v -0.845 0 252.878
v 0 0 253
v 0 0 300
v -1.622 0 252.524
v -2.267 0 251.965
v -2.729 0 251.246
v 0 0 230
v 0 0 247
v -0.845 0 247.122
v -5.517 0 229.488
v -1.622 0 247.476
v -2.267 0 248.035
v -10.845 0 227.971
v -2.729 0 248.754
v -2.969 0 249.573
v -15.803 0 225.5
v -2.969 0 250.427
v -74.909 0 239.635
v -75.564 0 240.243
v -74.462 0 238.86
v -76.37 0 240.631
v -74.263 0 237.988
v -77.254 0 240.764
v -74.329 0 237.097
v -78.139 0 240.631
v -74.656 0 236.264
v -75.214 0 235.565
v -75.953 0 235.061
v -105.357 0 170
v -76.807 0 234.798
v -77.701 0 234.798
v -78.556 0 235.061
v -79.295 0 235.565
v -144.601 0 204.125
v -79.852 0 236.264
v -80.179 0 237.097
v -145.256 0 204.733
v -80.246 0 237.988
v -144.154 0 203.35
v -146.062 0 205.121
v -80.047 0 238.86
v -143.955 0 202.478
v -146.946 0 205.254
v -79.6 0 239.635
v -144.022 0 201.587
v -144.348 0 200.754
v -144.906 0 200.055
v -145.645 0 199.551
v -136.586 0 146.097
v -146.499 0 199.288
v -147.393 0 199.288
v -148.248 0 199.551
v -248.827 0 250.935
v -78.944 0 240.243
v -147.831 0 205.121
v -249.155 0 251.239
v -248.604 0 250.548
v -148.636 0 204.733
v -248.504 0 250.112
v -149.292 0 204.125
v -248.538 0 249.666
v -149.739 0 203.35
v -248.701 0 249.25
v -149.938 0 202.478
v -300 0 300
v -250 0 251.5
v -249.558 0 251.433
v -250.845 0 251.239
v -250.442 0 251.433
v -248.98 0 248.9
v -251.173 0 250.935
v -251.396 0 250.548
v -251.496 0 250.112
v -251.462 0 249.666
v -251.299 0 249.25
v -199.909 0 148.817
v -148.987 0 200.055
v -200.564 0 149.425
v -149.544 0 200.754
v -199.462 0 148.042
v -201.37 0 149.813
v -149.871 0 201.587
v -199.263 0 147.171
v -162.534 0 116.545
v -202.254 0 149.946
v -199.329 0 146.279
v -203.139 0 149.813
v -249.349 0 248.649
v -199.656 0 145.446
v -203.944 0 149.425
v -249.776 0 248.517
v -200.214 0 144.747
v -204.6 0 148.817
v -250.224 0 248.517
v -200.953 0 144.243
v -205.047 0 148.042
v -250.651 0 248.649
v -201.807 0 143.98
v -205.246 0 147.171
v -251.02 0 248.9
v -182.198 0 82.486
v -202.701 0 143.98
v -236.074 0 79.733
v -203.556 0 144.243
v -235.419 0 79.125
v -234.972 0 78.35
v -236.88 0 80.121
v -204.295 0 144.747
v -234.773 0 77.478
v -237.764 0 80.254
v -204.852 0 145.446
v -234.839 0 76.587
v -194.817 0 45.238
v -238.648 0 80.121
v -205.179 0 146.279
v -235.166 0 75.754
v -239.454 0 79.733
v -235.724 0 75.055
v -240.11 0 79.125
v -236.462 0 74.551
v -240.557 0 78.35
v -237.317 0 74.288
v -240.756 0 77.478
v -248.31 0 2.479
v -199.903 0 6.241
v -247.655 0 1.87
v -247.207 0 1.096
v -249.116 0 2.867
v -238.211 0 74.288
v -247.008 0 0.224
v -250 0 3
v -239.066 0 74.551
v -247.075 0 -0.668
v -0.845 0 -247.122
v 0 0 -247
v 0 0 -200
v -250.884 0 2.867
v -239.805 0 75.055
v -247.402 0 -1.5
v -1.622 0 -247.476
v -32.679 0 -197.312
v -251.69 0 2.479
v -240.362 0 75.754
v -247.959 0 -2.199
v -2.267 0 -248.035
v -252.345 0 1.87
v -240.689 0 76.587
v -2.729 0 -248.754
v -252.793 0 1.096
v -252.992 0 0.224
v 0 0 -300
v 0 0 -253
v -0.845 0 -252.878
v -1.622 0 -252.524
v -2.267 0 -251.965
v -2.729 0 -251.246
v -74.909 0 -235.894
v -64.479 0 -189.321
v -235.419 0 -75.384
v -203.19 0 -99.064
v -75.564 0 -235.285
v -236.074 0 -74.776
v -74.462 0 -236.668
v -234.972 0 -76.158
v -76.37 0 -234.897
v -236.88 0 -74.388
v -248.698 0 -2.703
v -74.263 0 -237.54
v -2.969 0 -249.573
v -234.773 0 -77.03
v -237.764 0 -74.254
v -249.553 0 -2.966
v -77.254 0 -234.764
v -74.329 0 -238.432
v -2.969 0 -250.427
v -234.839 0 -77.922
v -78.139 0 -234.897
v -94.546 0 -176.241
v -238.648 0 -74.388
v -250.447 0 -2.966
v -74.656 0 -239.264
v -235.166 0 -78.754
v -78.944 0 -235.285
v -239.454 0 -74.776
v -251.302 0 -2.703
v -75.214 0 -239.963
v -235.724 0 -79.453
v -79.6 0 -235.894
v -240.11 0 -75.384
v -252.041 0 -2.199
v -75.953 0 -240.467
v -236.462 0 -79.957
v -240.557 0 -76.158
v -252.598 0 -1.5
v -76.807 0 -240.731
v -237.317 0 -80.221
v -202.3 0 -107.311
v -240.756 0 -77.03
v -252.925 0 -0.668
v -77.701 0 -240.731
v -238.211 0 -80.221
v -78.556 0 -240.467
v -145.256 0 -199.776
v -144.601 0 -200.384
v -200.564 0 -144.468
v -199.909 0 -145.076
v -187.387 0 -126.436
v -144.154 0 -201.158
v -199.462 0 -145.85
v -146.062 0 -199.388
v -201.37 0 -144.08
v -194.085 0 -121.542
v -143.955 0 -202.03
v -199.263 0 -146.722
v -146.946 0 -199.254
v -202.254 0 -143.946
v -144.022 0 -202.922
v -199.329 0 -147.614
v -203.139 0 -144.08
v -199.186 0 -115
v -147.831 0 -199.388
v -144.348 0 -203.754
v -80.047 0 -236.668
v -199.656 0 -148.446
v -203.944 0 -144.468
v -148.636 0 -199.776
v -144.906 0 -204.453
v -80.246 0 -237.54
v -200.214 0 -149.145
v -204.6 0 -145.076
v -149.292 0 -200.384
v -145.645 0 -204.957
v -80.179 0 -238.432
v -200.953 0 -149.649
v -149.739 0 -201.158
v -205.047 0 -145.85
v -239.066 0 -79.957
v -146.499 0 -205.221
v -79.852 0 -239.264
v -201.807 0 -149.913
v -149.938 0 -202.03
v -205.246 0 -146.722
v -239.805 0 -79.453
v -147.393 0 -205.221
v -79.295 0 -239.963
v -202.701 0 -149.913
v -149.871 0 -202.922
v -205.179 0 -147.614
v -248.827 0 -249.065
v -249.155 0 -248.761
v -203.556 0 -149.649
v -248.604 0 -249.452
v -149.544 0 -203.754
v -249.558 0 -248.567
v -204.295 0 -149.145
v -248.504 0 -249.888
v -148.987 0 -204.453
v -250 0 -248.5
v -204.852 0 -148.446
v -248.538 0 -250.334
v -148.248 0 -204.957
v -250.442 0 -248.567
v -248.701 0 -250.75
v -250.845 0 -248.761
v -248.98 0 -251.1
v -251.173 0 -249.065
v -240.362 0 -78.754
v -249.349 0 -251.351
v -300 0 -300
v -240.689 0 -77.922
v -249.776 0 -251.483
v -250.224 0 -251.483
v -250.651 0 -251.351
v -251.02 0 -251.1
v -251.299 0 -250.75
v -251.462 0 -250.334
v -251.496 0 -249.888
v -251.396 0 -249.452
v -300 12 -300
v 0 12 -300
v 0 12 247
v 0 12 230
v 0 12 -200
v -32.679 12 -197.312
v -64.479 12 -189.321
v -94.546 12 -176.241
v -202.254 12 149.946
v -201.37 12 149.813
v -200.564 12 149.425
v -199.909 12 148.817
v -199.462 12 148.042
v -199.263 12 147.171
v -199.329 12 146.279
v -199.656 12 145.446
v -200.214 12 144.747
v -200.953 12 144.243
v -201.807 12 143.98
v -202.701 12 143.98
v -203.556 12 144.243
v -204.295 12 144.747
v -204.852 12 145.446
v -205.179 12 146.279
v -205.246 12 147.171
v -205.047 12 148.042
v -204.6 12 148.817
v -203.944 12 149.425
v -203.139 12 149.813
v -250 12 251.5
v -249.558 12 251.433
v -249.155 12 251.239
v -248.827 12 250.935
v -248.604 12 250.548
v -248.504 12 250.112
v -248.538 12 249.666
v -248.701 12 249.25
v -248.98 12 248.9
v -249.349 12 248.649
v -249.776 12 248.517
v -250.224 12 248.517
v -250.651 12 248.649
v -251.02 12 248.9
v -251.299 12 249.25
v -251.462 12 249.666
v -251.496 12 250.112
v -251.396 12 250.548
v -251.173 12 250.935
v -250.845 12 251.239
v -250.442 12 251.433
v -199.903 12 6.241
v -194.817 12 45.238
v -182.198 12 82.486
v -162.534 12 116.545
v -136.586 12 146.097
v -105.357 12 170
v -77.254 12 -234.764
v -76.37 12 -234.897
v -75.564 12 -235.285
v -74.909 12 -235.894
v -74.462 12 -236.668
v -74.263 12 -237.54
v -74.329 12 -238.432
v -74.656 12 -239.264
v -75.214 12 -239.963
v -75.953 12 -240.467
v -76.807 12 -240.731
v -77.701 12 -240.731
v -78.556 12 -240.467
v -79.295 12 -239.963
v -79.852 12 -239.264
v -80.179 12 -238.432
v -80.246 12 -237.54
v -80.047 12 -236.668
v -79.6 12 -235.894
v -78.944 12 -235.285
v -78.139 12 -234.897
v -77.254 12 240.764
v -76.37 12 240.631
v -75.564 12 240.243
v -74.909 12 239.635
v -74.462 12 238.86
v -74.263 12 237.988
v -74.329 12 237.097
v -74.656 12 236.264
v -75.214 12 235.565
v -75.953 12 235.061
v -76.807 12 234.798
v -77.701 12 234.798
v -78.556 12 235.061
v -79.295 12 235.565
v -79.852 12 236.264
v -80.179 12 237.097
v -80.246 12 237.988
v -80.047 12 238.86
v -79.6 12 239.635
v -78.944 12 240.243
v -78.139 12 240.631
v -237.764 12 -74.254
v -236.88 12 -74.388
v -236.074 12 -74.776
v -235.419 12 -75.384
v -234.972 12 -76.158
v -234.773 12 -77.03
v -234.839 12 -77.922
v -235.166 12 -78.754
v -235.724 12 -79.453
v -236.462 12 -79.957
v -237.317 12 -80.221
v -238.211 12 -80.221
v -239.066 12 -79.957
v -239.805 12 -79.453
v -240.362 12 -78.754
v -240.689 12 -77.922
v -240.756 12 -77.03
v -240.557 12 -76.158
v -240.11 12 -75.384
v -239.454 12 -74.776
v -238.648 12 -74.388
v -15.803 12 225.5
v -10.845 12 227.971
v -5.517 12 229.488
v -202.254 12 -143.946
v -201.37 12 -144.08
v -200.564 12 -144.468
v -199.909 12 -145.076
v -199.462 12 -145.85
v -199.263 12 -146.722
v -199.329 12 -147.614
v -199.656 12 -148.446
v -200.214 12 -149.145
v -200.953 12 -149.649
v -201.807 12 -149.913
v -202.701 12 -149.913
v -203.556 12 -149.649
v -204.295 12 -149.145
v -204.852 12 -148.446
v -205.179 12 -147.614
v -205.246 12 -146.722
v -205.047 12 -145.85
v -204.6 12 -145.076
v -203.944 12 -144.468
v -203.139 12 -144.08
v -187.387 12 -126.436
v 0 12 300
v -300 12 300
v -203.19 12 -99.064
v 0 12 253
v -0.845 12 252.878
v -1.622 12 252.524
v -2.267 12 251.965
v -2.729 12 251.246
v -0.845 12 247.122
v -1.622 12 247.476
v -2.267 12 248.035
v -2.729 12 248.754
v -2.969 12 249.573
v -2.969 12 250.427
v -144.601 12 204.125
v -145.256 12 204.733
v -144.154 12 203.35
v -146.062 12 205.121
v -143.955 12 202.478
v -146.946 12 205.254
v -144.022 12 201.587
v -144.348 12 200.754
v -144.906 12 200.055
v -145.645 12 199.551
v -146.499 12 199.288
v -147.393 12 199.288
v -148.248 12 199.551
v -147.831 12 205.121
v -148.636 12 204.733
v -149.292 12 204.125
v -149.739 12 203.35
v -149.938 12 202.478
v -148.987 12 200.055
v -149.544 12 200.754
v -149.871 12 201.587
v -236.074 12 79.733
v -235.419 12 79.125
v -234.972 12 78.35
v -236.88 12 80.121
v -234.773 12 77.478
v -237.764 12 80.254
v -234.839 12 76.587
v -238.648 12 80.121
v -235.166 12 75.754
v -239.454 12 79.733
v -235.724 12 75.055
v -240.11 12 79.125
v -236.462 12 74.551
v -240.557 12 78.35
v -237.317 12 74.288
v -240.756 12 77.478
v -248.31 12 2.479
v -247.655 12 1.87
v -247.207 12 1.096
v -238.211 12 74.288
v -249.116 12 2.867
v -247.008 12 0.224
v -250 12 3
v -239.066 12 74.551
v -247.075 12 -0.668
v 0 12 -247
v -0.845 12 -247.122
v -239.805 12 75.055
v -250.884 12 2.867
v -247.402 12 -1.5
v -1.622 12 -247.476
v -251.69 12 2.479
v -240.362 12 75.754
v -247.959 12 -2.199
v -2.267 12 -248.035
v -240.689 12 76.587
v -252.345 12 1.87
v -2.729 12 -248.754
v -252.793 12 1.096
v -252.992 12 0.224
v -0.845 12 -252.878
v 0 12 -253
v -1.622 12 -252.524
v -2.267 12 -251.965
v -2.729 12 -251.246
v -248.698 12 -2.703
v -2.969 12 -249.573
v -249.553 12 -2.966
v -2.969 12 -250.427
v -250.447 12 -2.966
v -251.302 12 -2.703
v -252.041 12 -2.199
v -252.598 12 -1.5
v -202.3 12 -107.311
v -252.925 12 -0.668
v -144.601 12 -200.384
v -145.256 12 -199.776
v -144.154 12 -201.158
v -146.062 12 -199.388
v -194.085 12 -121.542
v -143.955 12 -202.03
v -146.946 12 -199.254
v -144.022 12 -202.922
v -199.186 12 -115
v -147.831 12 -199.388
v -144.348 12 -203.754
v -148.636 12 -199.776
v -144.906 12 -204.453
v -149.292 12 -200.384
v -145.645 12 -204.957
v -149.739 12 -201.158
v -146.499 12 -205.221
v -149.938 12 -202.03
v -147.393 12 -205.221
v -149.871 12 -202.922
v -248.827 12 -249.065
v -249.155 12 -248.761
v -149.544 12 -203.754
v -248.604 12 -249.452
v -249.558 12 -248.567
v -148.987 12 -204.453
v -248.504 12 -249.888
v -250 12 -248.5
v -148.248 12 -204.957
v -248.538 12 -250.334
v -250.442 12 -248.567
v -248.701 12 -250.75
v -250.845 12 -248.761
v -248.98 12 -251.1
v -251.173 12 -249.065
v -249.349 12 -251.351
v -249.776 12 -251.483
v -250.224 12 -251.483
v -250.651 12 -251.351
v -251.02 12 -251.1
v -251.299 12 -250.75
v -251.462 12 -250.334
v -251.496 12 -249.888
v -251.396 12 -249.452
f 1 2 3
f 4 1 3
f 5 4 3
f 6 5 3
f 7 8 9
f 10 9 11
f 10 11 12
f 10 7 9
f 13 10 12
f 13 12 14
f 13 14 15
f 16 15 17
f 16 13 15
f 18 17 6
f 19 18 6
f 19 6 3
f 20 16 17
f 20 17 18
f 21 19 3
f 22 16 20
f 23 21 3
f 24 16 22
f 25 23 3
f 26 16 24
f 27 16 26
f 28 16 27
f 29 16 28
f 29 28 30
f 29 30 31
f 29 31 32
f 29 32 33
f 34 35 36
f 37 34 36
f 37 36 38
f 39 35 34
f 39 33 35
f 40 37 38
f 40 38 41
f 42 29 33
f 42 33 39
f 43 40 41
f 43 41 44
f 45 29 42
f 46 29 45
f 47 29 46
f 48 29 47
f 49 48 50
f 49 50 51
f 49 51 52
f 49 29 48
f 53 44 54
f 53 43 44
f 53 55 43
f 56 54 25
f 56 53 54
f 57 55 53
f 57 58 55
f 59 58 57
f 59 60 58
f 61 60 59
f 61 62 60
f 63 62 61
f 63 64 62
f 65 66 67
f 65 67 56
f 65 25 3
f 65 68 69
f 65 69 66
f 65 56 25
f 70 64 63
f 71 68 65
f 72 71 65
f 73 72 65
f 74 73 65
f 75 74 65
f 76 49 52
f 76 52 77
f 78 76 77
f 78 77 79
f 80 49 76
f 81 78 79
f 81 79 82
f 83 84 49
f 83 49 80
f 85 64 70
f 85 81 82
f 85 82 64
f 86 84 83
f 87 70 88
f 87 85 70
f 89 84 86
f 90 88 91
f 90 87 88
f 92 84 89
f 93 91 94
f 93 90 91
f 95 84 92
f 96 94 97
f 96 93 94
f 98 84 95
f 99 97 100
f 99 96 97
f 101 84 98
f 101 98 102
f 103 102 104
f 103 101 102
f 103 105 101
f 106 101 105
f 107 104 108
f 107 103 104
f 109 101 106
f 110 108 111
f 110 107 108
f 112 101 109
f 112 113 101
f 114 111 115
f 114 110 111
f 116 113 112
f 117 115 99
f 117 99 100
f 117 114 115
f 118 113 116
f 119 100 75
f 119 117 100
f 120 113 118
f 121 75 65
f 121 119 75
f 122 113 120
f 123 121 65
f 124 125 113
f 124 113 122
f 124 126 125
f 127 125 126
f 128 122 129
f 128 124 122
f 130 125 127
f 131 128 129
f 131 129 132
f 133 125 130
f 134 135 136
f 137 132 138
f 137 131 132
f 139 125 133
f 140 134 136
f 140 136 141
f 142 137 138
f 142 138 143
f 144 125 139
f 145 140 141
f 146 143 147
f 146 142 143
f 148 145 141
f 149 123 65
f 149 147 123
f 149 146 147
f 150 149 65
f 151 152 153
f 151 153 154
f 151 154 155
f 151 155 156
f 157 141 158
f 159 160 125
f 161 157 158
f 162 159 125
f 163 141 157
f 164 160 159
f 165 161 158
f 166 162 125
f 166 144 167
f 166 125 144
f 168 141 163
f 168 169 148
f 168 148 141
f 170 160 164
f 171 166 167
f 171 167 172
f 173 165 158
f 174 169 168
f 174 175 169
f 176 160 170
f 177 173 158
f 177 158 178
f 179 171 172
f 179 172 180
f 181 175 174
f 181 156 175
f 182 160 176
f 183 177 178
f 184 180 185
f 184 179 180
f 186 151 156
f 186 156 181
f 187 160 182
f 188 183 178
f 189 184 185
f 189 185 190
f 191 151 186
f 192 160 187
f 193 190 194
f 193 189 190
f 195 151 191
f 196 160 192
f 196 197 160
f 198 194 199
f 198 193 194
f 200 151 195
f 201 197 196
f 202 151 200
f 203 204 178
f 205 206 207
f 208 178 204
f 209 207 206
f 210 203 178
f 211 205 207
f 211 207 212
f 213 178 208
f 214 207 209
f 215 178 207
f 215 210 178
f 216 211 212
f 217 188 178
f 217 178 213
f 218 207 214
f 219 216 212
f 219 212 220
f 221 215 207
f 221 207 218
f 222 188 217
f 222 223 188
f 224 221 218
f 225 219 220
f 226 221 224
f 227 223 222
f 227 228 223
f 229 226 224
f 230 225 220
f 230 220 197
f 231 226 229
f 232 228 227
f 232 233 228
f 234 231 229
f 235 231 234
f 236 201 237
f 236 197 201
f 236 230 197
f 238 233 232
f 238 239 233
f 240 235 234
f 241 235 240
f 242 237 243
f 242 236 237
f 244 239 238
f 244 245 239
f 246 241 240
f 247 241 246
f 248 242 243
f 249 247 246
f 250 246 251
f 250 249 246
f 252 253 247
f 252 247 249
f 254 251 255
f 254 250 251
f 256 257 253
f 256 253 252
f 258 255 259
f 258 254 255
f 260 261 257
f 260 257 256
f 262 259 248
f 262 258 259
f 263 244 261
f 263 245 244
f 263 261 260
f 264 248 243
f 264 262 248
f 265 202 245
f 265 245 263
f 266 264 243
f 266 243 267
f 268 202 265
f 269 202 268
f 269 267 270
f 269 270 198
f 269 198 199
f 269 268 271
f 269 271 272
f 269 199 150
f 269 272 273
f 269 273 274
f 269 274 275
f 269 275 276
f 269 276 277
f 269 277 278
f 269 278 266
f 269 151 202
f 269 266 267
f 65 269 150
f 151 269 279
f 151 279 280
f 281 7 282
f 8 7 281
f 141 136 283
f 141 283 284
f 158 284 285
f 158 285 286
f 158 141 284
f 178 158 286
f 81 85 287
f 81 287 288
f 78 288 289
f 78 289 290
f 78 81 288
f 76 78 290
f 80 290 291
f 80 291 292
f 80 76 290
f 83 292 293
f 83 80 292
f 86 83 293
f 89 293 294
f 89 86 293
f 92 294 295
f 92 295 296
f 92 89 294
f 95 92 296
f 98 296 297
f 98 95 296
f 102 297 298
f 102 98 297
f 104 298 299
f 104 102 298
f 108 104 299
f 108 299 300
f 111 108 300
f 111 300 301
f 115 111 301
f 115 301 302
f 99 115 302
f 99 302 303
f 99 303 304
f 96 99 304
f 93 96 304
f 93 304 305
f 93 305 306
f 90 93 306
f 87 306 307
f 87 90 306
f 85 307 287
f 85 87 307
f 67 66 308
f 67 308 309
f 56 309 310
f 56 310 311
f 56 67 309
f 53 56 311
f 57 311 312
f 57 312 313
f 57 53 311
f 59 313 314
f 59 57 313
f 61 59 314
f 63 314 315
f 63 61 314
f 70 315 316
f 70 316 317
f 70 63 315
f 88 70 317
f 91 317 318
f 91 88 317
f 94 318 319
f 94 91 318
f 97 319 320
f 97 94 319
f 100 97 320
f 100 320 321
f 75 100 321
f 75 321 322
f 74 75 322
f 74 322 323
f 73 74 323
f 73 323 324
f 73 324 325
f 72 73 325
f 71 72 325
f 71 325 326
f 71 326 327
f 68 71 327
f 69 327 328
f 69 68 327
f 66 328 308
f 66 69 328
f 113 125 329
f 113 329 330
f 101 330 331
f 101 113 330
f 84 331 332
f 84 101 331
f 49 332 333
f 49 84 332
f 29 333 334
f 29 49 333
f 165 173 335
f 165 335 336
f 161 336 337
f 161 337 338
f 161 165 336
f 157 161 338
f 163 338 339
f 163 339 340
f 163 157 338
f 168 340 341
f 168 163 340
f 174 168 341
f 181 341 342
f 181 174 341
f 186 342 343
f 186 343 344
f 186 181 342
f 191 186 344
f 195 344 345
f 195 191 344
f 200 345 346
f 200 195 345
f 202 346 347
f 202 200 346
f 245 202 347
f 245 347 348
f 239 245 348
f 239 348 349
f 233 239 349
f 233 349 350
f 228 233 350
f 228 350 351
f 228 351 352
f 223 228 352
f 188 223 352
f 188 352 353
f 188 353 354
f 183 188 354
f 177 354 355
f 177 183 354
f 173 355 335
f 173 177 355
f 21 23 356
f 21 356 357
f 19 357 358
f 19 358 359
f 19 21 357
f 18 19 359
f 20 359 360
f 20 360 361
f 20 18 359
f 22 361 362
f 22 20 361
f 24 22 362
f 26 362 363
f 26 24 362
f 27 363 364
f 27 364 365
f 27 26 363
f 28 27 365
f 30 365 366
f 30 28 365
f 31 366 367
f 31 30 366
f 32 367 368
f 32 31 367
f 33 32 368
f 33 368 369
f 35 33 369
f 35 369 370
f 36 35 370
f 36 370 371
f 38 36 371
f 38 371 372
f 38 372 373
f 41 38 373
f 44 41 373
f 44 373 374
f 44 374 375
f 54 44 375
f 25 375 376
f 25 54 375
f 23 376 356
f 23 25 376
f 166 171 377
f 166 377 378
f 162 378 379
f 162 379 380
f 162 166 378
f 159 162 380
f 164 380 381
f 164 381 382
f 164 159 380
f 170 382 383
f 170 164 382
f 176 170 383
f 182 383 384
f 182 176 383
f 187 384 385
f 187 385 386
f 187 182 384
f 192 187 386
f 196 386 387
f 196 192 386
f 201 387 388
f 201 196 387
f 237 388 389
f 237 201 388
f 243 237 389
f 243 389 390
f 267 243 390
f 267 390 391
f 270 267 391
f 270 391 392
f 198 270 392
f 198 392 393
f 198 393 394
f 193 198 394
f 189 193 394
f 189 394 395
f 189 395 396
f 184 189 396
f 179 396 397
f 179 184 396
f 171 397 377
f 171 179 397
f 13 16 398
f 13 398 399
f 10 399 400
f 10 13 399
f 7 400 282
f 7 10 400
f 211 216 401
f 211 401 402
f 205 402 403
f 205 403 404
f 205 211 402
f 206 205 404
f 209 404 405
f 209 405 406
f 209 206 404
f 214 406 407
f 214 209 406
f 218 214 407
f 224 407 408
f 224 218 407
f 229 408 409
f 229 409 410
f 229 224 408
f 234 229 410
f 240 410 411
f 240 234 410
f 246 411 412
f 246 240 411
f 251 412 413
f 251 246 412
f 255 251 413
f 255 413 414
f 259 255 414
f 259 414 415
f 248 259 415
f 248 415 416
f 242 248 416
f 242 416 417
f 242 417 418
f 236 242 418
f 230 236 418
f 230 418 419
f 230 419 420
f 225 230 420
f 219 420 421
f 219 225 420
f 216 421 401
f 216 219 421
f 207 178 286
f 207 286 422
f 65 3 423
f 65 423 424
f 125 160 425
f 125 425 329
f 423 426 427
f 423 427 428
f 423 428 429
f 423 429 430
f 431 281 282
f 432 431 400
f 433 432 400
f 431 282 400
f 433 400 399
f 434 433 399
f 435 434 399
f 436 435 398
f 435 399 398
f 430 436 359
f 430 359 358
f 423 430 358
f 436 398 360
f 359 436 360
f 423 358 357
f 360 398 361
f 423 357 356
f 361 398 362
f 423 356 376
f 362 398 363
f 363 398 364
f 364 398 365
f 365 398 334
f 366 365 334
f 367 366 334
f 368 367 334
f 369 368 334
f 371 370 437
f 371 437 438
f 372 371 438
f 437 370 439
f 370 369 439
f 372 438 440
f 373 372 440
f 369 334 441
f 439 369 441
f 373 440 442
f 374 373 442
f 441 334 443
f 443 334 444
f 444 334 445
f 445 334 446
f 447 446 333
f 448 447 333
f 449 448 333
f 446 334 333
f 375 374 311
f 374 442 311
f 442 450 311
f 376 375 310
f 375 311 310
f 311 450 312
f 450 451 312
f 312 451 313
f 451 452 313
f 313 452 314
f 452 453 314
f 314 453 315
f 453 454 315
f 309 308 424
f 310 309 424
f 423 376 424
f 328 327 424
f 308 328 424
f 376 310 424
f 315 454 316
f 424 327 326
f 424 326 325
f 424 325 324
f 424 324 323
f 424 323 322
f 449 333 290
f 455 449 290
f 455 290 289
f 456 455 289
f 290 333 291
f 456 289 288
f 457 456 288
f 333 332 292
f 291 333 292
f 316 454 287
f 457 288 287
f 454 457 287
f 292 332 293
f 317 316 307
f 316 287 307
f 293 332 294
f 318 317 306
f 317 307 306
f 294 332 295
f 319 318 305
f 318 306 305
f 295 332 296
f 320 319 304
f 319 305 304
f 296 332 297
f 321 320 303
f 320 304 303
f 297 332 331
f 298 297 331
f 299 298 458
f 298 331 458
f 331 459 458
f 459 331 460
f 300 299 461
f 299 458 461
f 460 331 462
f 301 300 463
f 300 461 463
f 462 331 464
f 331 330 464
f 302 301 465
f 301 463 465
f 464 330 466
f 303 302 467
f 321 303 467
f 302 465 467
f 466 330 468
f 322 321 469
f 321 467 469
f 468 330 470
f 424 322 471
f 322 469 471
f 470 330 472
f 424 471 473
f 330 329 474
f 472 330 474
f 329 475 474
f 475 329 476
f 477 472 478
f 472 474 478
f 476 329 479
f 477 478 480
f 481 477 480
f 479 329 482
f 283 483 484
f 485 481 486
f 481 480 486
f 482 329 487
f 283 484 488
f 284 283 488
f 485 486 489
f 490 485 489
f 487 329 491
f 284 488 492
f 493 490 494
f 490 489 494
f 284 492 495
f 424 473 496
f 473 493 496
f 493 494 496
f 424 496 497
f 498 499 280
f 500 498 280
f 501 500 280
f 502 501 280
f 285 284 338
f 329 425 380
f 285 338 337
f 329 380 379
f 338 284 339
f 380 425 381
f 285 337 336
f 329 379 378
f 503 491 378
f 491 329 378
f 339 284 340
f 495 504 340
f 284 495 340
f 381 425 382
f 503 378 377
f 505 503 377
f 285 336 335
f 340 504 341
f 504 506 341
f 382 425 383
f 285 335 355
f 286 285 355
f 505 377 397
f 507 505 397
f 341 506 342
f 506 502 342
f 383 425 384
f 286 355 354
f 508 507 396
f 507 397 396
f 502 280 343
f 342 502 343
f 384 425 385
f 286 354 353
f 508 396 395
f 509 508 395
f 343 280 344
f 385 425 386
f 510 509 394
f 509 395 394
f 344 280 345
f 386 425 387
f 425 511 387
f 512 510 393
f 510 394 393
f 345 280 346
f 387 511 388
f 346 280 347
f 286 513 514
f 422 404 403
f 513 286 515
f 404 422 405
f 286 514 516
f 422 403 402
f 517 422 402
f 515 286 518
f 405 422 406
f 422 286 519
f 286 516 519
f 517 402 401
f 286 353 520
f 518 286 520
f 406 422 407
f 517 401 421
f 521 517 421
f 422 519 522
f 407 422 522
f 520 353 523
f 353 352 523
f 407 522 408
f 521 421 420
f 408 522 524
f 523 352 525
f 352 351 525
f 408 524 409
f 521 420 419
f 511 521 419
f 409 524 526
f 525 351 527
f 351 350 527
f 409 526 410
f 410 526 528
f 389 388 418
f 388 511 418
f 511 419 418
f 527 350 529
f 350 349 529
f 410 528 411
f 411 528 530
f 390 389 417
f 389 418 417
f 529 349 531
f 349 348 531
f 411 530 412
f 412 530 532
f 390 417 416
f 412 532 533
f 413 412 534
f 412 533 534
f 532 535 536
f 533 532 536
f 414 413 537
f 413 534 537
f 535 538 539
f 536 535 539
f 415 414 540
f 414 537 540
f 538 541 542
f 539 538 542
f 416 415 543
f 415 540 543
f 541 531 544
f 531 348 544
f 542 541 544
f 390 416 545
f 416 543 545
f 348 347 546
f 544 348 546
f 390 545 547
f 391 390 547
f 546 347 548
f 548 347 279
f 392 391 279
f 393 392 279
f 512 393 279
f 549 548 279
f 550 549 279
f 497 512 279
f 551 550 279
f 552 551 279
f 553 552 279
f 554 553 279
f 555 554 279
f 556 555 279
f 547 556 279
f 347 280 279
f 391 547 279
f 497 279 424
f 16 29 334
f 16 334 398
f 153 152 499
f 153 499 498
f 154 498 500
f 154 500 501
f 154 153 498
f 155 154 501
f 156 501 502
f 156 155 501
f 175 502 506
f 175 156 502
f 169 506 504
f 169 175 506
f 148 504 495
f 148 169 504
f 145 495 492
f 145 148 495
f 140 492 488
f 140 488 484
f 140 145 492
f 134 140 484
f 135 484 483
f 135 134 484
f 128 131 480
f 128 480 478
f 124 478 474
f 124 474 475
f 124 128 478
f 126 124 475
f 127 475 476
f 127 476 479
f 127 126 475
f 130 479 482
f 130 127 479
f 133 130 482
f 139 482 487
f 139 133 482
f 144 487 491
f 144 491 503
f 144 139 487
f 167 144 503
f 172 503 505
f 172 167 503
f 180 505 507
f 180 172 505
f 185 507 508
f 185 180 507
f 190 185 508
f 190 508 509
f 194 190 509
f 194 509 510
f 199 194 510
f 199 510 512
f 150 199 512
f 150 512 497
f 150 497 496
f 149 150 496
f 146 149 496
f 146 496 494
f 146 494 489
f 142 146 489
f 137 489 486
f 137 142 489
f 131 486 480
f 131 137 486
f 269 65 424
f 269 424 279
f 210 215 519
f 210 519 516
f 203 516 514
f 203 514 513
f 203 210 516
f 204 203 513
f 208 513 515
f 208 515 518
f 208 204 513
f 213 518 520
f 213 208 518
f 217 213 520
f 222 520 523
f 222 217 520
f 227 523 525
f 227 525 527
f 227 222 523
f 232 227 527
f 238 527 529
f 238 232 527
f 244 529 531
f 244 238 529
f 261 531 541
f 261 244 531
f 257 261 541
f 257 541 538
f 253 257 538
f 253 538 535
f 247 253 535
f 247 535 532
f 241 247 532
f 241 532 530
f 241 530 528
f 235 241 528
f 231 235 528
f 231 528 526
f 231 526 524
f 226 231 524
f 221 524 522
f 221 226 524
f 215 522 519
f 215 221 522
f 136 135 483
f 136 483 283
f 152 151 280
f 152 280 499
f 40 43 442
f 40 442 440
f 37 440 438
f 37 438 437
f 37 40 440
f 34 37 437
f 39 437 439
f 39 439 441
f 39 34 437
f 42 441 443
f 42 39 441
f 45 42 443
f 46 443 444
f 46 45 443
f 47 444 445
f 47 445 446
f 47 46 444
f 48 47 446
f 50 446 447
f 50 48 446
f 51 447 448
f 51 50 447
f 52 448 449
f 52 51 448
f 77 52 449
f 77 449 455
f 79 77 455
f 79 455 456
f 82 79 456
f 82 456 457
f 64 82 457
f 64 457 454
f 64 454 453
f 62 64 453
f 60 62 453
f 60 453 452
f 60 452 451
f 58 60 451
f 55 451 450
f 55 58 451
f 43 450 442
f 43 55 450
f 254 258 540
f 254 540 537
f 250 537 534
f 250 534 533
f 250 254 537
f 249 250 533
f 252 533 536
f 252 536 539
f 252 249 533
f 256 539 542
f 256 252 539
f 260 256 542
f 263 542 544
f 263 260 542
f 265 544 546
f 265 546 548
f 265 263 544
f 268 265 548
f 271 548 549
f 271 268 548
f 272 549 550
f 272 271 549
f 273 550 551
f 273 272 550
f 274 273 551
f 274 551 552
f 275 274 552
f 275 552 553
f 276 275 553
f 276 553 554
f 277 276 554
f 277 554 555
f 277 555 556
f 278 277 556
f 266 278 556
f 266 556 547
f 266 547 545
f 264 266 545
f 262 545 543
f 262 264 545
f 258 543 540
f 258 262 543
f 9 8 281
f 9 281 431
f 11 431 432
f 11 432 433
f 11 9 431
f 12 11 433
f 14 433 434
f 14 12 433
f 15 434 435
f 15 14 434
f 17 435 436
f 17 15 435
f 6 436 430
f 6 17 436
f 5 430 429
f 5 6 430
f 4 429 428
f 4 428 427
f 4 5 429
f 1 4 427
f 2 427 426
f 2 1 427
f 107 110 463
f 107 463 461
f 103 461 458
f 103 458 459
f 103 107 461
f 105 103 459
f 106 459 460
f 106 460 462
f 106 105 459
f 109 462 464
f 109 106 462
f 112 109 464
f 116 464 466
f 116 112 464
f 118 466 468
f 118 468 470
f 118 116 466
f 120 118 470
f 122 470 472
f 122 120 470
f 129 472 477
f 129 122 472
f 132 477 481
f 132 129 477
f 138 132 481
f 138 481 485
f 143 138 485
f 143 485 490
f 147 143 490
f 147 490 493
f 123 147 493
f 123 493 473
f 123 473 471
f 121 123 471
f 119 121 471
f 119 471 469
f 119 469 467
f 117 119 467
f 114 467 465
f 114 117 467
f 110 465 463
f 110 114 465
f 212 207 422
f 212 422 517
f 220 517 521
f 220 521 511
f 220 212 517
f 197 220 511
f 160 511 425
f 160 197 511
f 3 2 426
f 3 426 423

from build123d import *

# Parameters (mm, degrees)
SKETCH1_R           = 3
SKETCH1_R_2         = 1.5
BOSS_EXTRUDE1_DEPTH = 12


with BuildPart() as part:
    # Sketch1 → Boss-Extrude1 (new body)
    with BuildSketch(Plane(origin=(0, 0, 0), x_dir=(1, 0, 0), z_dir=(0, 1, 0))):
        with BuildLine():
            Line((-203.190468868, 99.063784307), (-199.902587408, -6.241437954))
            ThreePointArc((-199.902587408, -6.241437954), (-173.205080757, -100), (-105.356537529, -170))
            Line((-105.356537529, -170), (-15.803480629, -225.5))
            ThreePointArc((-15.803480629, -225.5), (-8.215838363, -228.853076093), (0, -230))
            Line((0, -230), (0, -247))
            ThreePointArc((0, -247), (-3, -250), (0, -253))
            Line((0, -253), (0, -300))
            Line((0, -300), (-300, -300))
            Line((-300, -300), (-300, 300))
            Line((-300, 300), (0, 300))
            Line((0, 300), (0, 253))
            ThreePointArc((0, 253), (-3, 250), (0, 247))
            Line((0, 247), (0, 200))
            ThreePointArc((0, 200), (-48.742755406, 193.969440365), (-94.546049879, 176.241437954))
            Line((-94.546049879, 176.241437954), (-187.386988239, 126.436215693))
            ThreePointArc((-187.386988239, 126.436215693), (-199.18584287, 115), (-203.190468868, 99.063784307))
        make_face()
        with Locations(Location((-77.254248594, -237.764129074, 0), (0, 0, 270))):
            Circle(SKETCH1_R, mode=Mode.SUBTRACT)
        with Locations(Location((-146.946313073, -202.254248594, 0), (0, 0, 270))):
            Circle(SKETCH1_R, mode=Mode.SUBTRACT)
        with Locations(Location((-202.254248594, -146.946313073, 0), (0, 0, 270))):
            Circle(SKETCH1_R, mode=Mode.SUBTRACT)
        with Locations(Location((-237.764129074, -77.254248594, 0), (0, 0, 270))):
            Circle(SKETCH1_R, mode=Mode.SUBTRACT)
        with Locations(Location((-250, 0, 0), (0, 0, 270))):
            Circle(SKETCH1_R, mode=Mode.SUBTRACT)
        with Locations(Location((-237.764129074, 77.254248594, 0), (0, 0, 270))):
            Circle(SKETCH1_R, mode=Mode.SUBTRACT)
        with Locations(Location((-202.254248594, 146.946313073, 0), (0, 0, 270))):
            Circle(SKETCH1_R, mode=Mode.SUBTRACT)
        with Locations(Location((-146.946313073, 202.254248594, 0), (0, 0, 270))):
            Circle(SKETCH1_R, mode=Mode.SUBTRACT)
        with Locations(Location((-77.254248594, 237.764129074, 0), (0, 0, 270))):
            Circle(SKETCH1_R, mode=Mode.SUBTRACT)
        with Locations(Location((-250, 250, 0), (0, 0, 270))):
            Circle(SKETCH1_R_2, mode=Mode.SUBTRACT)
        with Locations(Location((-250, -250, 0), (0, 0, 270))):
            Circle(SKETCH1_R_2, mode=Mode.SUBTRACT)
    extrude(amount=BOSS_EXTRUDE1_DEPTH)


solid = part.part
